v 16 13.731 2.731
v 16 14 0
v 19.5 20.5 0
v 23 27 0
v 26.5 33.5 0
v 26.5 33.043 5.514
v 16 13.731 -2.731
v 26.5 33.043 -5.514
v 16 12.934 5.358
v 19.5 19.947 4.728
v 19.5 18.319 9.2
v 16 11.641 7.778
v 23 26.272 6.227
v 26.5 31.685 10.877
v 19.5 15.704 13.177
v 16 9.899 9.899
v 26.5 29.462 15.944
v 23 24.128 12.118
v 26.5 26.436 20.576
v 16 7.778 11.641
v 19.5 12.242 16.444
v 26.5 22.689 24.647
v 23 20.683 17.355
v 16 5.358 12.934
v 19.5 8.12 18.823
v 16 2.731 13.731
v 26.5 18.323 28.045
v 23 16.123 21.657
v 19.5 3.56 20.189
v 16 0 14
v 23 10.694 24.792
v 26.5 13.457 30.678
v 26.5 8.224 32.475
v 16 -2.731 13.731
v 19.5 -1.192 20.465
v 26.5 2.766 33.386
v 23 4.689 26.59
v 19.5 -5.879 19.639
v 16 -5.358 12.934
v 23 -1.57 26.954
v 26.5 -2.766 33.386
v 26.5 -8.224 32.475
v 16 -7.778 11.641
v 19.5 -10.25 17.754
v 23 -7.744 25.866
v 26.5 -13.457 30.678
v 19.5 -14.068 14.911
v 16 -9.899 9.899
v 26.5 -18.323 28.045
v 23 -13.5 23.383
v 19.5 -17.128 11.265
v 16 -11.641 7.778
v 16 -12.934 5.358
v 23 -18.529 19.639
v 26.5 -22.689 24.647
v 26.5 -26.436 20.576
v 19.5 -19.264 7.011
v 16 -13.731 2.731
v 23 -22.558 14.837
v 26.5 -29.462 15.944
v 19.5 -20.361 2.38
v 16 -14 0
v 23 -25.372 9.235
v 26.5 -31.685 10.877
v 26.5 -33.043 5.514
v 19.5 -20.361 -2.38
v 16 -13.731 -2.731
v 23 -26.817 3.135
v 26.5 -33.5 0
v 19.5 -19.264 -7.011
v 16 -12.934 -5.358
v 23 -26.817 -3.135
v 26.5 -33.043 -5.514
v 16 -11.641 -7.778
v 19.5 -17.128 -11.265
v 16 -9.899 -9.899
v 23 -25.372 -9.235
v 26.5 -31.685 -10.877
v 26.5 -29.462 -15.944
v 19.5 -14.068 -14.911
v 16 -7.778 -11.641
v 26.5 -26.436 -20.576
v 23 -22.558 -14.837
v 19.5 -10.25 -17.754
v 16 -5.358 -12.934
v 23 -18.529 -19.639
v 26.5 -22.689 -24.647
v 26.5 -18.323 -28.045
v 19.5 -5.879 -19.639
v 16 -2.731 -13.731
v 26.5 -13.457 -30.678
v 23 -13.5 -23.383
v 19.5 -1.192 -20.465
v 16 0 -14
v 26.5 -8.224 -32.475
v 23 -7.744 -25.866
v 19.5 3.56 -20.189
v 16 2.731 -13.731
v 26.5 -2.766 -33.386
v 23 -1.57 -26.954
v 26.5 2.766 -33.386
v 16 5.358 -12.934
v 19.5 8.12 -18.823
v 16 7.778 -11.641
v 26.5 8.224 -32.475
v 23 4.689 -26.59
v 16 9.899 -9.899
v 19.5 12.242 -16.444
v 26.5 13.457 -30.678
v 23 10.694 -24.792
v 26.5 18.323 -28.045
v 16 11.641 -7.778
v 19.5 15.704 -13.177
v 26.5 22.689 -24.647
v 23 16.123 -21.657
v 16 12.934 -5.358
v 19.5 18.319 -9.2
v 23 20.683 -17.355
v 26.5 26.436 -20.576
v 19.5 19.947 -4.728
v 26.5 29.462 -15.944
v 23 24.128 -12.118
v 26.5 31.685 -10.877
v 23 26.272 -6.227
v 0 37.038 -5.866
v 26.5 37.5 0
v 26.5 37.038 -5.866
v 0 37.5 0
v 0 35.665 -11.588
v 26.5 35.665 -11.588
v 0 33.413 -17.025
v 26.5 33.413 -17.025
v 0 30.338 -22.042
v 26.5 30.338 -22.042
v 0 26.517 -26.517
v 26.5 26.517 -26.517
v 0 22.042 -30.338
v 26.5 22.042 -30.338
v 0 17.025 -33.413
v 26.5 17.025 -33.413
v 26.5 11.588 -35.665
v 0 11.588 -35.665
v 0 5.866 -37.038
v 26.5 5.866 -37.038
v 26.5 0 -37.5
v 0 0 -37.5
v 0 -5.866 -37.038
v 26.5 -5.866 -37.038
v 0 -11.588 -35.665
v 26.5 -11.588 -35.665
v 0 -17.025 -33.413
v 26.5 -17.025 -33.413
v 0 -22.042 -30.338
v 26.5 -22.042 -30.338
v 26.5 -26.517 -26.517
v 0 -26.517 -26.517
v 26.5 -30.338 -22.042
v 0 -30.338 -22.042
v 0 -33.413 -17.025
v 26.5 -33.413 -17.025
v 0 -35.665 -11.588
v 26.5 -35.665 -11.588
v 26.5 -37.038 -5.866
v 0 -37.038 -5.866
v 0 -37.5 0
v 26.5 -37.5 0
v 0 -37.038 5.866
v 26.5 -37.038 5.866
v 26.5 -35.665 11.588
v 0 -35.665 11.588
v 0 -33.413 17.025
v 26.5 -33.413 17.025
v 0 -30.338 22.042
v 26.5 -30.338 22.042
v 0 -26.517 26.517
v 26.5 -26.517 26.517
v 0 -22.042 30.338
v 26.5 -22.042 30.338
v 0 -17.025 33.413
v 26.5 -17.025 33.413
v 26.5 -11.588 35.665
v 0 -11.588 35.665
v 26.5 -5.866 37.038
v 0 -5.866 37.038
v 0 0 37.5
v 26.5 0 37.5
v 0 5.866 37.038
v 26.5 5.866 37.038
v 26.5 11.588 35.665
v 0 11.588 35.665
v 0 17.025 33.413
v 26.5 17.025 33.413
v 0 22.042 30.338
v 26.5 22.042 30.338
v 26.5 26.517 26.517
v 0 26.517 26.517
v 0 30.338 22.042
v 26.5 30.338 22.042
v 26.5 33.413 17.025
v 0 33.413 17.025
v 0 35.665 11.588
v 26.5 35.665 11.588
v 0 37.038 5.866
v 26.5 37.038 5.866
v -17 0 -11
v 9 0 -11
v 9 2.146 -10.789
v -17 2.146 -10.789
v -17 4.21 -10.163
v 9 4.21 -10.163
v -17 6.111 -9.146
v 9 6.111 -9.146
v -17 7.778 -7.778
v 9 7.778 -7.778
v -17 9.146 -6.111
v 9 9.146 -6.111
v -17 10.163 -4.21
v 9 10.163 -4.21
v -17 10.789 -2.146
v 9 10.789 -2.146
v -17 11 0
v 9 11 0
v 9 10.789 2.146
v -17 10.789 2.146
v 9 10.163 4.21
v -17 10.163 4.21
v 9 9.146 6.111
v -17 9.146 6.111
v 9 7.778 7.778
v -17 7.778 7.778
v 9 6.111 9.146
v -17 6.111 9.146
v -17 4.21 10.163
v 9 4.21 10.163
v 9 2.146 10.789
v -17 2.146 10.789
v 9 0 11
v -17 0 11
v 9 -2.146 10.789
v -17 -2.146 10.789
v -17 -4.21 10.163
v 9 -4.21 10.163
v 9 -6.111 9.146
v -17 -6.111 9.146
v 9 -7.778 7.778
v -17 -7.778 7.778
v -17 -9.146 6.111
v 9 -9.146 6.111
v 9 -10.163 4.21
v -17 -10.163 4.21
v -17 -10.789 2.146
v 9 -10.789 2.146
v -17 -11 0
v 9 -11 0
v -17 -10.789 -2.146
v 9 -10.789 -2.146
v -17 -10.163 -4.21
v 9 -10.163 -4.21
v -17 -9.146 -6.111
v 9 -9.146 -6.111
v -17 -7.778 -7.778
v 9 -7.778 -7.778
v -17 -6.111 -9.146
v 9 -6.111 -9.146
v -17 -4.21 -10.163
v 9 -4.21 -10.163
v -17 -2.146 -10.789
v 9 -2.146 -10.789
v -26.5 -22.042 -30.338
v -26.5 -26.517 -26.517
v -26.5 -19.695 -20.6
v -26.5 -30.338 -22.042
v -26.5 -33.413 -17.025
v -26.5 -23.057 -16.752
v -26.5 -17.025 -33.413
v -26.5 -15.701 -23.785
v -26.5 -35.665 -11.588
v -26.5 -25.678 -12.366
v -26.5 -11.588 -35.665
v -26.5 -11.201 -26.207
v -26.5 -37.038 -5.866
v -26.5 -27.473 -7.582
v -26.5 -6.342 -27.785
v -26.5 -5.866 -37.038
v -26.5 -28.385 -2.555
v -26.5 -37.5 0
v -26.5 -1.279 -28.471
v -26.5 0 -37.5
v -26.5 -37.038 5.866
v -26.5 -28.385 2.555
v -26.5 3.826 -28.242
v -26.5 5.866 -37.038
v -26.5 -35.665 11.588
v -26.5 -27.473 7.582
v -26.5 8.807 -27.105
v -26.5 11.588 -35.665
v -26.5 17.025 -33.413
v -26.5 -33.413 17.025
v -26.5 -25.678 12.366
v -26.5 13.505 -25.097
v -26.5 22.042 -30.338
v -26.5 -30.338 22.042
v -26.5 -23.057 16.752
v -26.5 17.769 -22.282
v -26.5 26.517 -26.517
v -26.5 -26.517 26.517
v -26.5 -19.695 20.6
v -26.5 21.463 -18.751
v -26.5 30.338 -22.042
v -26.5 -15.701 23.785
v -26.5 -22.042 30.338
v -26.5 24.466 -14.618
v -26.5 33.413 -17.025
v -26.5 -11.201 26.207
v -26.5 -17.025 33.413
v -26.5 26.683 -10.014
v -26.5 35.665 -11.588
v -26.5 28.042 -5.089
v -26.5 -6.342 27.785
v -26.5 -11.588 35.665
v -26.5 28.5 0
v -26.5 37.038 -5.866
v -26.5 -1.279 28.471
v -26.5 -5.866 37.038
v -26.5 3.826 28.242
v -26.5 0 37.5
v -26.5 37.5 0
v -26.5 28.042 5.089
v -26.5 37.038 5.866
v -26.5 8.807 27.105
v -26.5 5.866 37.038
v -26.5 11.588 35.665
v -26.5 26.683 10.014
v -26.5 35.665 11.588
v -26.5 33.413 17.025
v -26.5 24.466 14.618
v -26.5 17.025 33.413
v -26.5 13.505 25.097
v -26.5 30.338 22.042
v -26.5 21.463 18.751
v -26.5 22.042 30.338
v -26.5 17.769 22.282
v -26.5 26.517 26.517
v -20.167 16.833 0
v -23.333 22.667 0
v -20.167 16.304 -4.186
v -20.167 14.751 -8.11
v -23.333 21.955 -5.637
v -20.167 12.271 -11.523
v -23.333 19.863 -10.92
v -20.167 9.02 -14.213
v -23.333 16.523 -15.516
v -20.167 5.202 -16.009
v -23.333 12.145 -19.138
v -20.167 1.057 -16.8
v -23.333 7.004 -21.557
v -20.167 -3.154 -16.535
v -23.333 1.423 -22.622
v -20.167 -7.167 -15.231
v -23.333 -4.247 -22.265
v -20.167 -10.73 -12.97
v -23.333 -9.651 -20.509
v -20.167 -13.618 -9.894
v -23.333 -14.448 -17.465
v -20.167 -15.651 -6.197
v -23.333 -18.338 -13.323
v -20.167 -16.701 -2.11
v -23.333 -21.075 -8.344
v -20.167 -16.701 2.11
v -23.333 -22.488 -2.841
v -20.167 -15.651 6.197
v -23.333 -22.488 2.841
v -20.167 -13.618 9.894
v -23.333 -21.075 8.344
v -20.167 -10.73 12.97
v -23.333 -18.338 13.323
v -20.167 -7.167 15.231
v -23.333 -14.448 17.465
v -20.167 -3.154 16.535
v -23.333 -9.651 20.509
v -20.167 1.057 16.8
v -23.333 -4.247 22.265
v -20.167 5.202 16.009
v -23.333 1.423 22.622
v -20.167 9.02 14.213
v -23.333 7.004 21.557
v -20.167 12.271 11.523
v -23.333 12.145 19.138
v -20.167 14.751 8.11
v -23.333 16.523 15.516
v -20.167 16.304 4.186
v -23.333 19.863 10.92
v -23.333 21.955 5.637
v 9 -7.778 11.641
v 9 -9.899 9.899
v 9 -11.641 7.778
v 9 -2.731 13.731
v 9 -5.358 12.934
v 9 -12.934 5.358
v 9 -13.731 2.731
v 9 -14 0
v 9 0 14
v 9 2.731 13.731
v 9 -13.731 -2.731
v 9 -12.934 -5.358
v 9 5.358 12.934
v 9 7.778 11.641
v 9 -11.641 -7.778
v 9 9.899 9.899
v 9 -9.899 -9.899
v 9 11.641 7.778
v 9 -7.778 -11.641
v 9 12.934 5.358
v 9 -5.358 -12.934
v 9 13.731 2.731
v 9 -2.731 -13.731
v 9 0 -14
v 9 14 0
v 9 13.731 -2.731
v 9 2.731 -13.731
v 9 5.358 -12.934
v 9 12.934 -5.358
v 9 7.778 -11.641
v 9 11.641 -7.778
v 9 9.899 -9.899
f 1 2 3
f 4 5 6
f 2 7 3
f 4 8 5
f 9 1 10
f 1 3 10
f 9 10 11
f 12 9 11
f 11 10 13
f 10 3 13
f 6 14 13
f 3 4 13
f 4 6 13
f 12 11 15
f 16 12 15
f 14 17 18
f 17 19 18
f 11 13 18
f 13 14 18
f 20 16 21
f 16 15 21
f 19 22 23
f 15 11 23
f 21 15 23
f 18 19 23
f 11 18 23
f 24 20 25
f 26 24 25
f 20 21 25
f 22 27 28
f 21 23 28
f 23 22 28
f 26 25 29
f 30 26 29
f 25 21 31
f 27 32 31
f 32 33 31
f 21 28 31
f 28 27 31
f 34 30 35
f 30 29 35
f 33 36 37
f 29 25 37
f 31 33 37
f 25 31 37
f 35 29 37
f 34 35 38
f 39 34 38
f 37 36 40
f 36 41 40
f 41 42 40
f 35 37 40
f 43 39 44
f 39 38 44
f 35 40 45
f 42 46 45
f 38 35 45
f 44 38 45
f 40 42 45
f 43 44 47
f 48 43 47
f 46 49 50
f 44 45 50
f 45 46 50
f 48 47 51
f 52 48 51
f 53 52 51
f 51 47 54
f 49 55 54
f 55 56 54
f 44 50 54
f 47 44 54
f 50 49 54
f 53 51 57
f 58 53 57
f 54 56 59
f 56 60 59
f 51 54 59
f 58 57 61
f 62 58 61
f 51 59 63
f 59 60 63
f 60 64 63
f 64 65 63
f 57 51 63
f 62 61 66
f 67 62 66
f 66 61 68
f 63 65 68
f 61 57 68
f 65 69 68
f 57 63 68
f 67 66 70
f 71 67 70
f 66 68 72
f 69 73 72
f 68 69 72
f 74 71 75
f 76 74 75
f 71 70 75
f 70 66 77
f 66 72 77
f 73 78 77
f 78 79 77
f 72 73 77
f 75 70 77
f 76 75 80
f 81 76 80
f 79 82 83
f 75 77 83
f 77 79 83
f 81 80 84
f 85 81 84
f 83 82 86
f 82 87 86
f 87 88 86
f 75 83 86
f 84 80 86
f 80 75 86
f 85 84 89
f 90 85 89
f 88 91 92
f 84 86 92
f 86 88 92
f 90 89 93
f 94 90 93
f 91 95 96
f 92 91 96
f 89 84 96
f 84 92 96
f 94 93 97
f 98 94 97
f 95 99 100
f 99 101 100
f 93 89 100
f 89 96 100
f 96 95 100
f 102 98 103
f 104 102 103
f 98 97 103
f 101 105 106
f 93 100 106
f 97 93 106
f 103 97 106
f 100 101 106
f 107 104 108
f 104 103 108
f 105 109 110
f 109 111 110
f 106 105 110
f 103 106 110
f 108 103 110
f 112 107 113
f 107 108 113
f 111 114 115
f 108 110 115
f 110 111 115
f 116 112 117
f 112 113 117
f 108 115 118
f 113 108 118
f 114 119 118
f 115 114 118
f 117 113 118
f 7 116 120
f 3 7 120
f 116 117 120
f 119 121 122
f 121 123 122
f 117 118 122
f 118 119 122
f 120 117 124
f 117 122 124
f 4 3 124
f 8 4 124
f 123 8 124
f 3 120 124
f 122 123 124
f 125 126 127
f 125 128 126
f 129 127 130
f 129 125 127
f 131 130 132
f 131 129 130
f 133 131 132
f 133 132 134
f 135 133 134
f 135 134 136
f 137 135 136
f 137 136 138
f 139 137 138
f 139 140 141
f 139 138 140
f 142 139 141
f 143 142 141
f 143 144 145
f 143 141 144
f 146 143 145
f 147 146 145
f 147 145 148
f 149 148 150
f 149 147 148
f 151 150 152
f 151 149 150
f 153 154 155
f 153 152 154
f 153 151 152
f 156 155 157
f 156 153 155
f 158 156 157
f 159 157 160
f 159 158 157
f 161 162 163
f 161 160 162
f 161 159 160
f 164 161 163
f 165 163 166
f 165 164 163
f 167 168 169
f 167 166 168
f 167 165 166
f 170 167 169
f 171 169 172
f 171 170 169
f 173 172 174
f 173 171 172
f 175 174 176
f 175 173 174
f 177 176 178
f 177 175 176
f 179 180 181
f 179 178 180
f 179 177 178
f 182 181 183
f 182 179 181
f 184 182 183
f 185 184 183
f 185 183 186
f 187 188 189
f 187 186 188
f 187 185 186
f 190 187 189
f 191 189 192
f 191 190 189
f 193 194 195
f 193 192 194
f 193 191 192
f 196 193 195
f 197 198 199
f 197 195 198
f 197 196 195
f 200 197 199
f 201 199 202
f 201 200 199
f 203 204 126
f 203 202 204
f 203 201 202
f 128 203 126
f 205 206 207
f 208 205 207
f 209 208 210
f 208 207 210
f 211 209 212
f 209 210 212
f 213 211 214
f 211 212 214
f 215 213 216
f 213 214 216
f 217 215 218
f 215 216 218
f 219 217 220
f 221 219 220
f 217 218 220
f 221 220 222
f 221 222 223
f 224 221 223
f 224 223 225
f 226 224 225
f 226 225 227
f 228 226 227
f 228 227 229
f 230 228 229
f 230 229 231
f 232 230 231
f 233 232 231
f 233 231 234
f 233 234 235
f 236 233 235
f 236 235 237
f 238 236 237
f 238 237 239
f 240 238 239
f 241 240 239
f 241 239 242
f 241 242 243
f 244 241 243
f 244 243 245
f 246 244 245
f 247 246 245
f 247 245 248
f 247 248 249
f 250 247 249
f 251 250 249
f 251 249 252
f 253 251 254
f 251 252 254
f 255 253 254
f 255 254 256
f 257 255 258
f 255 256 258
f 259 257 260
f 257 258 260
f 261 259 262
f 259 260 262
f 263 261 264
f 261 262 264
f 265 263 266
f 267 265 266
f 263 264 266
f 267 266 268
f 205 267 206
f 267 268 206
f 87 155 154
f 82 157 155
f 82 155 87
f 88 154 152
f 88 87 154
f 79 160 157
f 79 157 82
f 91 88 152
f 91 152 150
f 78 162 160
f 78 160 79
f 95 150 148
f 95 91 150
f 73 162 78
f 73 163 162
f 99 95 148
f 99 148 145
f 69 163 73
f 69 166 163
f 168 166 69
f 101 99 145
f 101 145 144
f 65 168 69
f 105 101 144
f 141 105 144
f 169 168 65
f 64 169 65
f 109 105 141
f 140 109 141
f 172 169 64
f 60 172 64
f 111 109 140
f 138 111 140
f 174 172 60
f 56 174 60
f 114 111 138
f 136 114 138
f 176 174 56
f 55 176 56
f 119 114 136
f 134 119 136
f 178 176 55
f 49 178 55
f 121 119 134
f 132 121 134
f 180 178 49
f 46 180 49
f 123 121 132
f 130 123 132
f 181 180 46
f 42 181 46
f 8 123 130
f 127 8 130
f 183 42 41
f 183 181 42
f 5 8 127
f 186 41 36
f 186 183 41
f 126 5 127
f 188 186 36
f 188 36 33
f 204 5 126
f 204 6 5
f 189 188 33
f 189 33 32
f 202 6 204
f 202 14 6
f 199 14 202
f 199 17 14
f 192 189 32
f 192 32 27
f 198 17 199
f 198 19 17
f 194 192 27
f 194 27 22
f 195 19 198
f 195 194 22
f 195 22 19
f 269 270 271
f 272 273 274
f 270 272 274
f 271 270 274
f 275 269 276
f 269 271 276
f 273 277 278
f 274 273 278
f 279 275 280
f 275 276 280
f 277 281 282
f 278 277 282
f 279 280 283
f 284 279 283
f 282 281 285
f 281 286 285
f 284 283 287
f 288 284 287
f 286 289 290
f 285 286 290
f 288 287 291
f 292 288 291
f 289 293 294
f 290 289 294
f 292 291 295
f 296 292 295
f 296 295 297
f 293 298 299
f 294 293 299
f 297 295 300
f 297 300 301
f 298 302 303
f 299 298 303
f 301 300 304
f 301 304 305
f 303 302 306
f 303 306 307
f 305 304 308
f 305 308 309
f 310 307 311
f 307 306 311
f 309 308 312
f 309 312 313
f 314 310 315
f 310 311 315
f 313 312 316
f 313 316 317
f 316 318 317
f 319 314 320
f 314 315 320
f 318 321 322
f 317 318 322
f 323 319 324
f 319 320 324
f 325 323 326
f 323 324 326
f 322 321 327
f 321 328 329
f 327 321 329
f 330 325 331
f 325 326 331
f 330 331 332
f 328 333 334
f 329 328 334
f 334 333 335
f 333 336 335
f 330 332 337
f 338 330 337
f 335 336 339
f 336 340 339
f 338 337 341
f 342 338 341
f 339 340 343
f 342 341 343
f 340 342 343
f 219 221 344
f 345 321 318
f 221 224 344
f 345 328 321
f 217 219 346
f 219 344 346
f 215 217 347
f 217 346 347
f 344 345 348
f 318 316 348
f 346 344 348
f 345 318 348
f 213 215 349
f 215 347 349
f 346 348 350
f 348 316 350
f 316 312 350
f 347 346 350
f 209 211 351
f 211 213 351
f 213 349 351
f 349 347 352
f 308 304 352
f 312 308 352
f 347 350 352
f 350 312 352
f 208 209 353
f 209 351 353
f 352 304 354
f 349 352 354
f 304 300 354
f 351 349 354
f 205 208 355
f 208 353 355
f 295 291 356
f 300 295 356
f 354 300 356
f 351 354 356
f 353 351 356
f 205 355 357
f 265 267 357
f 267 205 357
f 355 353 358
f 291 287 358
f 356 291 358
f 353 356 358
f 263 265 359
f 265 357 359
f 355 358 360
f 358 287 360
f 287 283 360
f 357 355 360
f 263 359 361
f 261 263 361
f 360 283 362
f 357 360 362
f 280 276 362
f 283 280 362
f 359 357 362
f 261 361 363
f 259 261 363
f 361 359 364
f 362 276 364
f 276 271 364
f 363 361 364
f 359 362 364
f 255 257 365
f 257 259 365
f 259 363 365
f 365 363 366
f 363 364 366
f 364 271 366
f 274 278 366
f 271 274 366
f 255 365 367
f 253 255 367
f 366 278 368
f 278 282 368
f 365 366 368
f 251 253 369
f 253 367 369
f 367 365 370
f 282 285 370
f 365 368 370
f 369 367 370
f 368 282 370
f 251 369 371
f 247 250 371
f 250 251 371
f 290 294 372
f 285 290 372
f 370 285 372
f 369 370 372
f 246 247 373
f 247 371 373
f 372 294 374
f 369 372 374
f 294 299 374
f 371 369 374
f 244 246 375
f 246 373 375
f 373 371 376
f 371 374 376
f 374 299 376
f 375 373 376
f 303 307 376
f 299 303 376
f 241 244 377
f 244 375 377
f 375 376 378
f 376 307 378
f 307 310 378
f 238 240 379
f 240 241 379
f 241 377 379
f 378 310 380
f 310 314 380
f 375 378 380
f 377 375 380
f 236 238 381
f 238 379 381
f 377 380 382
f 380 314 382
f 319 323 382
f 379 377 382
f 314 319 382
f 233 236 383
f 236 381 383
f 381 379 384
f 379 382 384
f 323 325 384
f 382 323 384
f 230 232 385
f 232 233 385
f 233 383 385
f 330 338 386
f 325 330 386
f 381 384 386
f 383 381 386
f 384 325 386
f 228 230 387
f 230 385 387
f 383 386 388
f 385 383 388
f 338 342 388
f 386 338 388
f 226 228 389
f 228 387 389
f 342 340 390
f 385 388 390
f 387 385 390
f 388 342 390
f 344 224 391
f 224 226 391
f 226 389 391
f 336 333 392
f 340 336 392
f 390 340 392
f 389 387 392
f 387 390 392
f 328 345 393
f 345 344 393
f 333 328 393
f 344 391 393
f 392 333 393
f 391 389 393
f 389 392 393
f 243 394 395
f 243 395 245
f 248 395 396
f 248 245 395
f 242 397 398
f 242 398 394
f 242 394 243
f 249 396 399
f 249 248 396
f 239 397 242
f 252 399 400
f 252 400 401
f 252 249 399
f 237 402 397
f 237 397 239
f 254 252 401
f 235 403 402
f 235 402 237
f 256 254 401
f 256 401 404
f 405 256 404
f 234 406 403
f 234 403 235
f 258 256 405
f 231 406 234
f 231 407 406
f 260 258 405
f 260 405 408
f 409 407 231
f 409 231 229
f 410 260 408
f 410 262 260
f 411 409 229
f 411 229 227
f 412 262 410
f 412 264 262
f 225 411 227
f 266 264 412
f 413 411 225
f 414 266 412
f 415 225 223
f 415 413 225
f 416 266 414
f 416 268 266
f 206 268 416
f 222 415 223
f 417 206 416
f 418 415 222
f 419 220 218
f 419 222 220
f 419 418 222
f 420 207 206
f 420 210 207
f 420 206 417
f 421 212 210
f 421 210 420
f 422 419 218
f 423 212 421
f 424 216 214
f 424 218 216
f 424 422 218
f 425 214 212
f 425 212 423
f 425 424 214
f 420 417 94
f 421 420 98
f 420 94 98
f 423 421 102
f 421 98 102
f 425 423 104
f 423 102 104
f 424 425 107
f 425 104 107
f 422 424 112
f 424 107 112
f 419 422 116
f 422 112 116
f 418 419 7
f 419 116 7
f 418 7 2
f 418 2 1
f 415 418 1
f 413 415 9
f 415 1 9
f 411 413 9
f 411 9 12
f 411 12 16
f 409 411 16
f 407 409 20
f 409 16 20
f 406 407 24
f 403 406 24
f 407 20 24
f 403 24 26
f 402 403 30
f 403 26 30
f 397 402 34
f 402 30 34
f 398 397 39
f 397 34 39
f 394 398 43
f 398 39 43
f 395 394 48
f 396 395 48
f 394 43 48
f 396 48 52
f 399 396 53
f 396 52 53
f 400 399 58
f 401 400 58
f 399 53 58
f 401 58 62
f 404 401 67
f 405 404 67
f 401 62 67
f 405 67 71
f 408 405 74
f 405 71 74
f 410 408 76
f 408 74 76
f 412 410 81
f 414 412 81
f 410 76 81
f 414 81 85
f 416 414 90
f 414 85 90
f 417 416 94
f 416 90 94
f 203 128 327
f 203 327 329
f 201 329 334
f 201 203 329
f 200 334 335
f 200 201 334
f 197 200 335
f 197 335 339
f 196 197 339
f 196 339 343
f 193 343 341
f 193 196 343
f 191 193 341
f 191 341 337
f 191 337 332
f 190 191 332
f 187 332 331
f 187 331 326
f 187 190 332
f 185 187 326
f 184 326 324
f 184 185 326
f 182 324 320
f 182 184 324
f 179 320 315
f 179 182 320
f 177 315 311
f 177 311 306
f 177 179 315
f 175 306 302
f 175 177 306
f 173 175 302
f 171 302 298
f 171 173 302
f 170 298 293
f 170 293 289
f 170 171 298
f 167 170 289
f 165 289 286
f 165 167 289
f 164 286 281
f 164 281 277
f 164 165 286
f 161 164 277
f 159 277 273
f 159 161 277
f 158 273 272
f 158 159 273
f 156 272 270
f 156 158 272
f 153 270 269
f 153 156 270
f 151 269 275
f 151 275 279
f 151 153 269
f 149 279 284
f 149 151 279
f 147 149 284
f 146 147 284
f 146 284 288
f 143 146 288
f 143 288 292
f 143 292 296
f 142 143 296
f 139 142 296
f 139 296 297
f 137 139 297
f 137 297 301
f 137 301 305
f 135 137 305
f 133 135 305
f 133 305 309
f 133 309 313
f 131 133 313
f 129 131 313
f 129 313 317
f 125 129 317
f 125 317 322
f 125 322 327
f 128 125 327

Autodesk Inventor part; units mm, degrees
ref_plane "YZ Plane" through (0, 0, 0) normal (1, 0, 0) x (0, 1, 0)
ref_plane "XZ Plane" through (0, 0, 0) normal (0, 1, 0) x (-1, 0, 0)
ref_plane "XY Plane" through (0, 0, 0) normal (0, 0, 1) x (1, 0, 0)
sketch "Sketch1" plane through (0, 0, 0) normal (1, 0, 0) x (0, 1, 0)
  circle A0 centre (0, 0) radius 37.5
  dimension "d0" = 75
extrude "Extrusion1" add sketch "Sketch1" along normal mid plane 53
sketch "Sketch2" plane through (26.5, 0, 0) normal (1, 0, 0) x (0, 0, -1)
  circle A0 centre (0, 0) radius 14
  dimension "d3" = 28
extrude "Extrusion2" cut sketch "Sketch2" against normal blind 17.5
ref_plane "Work Plane1" through (16, 0, 0) normal (1, 0, 0) x (0, 0, -1)
sketch "Sketch3" plane through (0, 0, 0) normal (0, 0, 1) x (1, 0, 0)
  line L0 (-26.5, 37.5) -> (26.5, 37.5) projected
  line L1 (26.5, -37.5) -> (26.5, 37.5) projected
  line L2 (16, 52.5) -> (16, -52.5) projected
  line L3 (26.5, 33.5) -> (-26.5, 33.5)
  line L4 (-26.5, 37.5) -> (-26.5, -37.5) projected
  line L5 (26.5, 14) -> (9, 14) projected
  line L6 (16, 14) -> (26.5, 33.5)
  line L7 (-37.1, 0) -> (37.1, 0) projected
  point P0 (0, 0)
  dimension "d7" = 4
revolve "Revolution1" cut sketch "Sketch3" angle 360 about axis through (-10, 0, 0) along (1, 0, 0) contours L1 L5 L6
sketch "Sketch4" plane through (9, 0, 0) normal (1, 0, 0) x (0, 0, -1)
  circle A0 centre (0, 0) radius 11
  dimension "d9" = 22
extrude "Extrusion3" cut sketch "Sketch4" against normal through all
sketch "Sketch5" plane through (-26.5, 0, 0) normal (-1, 0, 0) x (0, 0, 1)
  circle A0 centre (0, 0) radius 28.5
  circle A1 centre (0, 0) radius 37.5 projected
  dimension "d13" = 9
ref_plane "Work Plane2" through (-17, 0, 0) normal (1, 0, 0) x (0, 0, -1)
sketch "Sketch6" plane through (0, 0, 0) normal (0, 0, 1) x (1, 0, 0)
  line L0 (-26.5, 28.5) -> (-26.5, -28.5) projected
  line L1 (9, 11) -> (-26.5, 11) projected
  line L2 (-17, 52.5) -> (-17, -52.5) projected
  line L3 (-17, 11) -> (-26.5, 28.5)
  line L4 (-37.1, 0) -> (37.1, 0) projected
  point P0 (0, 0)
revolve "Revolution2" cut sketch "Sketch6" angle 360 about axis through (-10, 0, 0) along (1, 0, 0) contours L3 L1 L0
properties part number "LongboardWheel_RI" material "Nylon 6/6"
